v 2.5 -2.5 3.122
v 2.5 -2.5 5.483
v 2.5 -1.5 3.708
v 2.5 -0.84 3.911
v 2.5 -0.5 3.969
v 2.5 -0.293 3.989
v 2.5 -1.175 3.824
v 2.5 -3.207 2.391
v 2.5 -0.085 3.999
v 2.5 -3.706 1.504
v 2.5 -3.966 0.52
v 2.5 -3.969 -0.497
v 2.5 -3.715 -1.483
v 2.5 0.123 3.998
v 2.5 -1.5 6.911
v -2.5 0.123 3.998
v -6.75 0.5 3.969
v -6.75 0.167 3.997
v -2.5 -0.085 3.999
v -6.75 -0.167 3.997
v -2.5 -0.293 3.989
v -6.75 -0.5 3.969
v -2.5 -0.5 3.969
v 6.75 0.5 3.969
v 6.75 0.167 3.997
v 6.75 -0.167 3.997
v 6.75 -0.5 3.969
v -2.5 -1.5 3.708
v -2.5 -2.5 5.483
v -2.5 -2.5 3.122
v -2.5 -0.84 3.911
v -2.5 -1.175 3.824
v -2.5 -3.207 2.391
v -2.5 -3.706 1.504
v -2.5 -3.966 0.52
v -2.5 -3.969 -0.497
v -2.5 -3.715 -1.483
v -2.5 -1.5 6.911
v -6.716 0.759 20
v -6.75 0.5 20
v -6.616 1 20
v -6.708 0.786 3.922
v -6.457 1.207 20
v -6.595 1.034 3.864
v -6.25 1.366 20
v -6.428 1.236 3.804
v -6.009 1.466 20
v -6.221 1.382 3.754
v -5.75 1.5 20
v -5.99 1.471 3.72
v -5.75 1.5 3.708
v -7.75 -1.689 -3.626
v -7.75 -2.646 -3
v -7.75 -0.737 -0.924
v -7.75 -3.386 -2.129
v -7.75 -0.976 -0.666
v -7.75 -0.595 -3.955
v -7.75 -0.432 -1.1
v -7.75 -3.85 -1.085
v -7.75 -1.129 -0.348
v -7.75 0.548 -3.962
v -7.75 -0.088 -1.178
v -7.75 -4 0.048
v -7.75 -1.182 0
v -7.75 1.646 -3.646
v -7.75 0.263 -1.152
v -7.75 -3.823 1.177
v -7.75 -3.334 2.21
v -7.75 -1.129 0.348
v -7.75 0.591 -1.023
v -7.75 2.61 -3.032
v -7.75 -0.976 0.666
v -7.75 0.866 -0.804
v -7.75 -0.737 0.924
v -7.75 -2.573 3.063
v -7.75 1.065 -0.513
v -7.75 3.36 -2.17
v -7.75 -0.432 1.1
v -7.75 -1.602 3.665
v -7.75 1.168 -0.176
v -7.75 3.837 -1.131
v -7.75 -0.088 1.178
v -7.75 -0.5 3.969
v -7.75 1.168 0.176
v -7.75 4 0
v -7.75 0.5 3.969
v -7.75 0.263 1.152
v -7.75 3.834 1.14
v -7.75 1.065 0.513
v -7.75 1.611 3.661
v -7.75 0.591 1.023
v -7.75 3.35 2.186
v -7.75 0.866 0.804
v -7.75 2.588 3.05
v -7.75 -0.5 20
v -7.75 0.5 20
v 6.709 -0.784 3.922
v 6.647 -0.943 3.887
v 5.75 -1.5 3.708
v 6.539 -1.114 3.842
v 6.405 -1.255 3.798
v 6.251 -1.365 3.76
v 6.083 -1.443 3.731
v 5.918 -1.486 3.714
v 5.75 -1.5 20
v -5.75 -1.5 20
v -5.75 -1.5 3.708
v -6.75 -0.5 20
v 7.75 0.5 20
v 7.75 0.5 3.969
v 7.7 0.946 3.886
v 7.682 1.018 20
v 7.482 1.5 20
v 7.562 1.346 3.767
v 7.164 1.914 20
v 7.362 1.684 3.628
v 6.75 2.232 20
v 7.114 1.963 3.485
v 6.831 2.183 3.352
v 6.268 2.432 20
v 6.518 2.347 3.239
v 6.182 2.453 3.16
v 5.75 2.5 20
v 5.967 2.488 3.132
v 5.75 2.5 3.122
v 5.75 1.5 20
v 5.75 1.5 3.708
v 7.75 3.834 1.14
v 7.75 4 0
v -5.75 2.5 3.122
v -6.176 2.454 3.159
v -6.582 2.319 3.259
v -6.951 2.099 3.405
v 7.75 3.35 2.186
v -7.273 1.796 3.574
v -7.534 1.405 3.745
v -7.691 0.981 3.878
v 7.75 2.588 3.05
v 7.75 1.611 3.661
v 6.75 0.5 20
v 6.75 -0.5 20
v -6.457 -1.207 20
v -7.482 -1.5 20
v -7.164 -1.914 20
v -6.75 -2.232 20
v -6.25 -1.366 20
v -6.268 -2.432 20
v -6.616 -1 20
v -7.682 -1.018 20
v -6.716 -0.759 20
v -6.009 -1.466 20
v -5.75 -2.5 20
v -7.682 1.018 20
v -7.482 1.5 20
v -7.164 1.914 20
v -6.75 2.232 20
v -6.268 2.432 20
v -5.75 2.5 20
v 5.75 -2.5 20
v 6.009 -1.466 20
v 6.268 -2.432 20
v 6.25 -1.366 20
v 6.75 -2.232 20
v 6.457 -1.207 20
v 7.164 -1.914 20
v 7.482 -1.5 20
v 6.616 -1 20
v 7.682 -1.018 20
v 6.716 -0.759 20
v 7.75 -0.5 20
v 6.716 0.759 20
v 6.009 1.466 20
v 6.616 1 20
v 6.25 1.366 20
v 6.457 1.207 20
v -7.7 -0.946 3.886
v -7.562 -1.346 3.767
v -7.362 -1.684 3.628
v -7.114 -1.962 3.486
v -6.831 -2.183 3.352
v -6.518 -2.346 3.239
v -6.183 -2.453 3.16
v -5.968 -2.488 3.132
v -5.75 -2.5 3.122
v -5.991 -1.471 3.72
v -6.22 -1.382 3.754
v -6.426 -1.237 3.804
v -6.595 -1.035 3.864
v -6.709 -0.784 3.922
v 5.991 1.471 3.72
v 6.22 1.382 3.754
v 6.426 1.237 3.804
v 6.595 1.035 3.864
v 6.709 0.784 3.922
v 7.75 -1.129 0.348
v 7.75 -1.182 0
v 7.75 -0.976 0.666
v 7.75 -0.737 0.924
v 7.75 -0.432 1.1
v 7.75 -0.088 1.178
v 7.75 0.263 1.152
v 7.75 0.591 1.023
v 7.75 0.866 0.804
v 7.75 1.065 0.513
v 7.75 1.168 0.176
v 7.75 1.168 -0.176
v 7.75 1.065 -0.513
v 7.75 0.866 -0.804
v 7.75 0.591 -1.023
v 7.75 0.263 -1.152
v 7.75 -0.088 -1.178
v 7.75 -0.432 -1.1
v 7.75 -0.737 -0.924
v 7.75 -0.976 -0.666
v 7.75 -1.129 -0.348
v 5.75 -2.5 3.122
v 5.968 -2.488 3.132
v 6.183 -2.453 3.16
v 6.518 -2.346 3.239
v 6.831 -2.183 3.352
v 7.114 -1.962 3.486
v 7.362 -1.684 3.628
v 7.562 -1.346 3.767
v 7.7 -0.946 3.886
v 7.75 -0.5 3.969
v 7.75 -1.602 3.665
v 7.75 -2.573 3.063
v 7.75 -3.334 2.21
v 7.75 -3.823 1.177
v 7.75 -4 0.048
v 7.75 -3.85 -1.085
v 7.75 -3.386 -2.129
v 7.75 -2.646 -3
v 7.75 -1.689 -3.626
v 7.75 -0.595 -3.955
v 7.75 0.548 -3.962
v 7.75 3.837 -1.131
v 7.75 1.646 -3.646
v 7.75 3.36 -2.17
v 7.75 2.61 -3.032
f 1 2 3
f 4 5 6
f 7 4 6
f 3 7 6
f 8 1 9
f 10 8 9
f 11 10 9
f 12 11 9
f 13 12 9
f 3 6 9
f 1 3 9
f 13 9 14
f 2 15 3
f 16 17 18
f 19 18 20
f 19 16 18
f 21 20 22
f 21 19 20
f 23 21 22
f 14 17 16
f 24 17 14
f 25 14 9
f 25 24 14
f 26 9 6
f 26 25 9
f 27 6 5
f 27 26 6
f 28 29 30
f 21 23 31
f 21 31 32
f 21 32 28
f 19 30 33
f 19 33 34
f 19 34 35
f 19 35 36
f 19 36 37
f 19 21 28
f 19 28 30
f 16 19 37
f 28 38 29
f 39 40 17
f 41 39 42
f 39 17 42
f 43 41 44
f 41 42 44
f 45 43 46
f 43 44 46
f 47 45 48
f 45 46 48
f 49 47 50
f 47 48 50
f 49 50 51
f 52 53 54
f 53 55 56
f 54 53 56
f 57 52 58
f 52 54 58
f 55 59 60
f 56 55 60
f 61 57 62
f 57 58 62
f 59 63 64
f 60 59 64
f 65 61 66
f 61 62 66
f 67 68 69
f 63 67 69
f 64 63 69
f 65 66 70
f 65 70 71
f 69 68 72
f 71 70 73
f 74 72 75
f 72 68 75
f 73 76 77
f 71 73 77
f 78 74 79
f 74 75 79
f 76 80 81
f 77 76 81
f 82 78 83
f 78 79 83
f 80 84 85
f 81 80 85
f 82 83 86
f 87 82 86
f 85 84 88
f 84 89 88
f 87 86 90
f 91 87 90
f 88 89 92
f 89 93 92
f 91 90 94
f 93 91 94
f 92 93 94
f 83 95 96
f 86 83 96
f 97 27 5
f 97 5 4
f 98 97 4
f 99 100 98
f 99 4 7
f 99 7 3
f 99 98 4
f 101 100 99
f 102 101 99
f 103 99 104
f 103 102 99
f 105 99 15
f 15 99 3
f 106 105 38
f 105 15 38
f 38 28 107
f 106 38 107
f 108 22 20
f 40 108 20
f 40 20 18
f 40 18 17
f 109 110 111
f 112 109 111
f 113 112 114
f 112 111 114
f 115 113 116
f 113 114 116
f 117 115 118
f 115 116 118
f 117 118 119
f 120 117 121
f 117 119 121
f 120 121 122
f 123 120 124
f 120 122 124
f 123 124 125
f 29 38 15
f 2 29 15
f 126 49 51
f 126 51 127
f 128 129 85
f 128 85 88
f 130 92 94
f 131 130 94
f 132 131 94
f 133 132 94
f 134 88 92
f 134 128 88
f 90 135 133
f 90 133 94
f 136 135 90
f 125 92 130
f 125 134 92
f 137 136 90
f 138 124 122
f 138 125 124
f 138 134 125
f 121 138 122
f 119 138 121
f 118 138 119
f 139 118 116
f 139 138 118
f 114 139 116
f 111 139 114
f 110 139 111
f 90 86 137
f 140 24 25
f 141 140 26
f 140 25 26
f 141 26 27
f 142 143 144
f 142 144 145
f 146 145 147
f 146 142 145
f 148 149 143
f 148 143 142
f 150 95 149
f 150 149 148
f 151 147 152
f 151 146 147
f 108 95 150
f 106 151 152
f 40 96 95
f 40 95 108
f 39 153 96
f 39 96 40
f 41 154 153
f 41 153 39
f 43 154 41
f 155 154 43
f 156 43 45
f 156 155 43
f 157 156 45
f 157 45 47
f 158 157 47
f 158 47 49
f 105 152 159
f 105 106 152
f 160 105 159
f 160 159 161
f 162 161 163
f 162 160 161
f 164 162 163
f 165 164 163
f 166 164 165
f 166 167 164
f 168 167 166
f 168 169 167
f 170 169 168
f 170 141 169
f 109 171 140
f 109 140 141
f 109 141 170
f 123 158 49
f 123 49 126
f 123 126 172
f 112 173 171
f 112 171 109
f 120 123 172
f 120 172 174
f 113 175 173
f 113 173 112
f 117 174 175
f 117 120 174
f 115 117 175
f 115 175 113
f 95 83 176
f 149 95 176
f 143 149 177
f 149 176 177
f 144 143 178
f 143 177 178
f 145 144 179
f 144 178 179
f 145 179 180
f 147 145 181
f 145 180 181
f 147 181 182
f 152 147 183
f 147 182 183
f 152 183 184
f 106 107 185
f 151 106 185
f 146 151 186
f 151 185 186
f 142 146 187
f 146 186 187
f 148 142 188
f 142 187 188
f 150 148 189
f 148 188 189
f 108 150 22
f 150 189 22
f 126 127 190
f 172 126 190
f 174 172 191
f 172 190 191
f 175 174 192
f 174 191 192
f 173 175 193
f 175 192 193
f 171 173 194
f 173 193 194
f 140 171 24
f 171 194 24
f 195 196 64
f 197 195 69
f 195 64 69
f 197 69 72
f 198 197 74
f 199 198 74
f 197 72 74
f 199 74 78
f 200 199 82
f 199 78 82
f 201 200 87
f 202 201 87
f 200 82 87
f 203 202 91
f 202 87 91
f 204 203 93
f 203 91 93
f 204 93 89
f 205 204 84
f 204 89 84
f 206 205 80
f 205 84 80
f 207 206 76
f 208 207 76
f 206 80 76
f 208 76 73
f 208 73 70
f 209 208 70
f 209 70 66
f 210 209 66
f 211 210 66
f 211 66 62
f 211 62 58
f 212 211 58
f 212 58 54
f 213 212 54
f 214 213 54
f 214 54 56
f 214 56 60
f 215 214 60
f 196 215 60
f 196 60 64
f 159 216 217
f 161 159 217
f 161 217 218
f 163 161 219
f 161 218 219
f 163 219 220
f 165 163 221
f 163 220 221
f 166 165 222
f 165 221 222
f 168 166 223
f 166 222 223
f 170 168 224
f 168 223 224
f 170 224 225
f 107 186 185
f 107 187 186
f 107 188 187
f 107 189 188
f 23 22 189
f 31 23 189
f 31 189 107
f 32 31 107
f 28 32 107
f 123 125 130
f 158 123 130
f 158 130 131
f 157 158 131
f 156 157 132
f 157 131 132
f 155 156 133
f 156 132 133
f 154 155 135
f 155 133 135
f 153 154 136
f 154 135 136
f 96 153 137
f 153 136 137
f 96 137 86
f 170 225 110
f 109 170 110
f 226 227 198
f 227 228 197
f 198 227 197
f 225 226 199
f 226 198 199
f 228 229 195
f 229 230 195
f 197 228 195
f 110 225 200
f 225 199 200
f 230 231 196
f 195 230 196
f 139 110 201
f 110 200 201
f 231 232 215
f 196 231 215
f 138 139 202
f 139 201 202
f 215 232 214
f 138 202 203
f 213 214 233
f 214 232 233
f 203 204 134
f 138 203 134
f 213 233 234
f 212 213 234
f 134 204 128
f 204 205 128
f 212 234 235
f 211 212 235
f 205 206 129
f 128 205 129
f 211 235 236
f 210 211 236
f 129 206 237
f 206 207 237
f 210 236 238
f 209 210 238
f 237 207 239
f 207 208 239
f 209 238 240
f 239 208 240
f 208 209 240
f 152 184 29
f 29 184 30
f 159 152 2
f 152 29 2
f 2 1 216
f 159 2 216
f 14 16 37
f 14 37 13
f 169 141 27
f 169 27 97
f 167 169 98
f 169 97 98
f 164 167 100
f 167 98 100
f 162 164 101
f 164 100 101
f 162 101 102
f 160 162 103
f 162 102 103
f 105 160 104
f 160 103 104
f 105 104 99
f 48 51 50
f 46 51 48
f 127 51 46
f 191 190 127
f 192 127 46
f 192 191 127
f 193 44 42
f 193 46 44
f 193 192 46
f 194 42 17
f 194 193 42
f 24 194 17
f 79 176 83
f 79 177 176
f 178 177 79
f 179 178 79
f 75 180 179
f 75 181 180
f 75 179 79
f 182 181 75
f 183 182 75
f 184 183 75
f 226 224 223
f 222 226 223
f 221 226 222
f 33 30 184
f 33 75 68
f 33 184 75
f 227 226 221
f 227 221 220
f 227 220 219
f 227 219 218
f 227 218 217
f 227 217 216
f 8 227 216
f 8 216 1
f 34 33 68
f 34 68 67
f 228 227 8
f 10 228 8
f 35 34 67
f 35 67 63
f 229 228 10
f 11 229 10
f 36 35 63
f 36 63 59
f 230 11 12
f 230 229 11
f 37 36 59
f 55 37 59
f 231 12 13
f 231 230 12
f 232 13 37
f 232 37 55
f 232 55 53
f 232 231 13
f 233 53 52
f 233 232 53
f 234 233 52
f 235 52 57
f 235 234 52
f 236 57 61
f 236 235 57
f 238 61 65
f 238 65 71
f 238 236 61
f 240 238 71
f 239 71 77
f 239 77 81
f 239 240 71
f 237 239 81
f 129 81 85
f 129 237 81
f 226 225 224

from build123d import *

# Parameters (mm, degrees)
F1_DEPTH = 20
F3_DEPTH = 15.5
F5_W     = 5
F5_H     = 3
F6_DEPTH = 4.5
F7_R     = 1.1815986622
F8_DEPTH = 25


with BuildPart() as f1:
    # F0 (on Top) → F1 (new body)
    with BuildSketch(Plane.XY):
        with BuildLine():
            Line((5.75, 2.5), (-5.75, 2.5))
            ThreePointArc((-5.75, 2.5), (-7.1642135624, 1.9142135624), (-7.75, 0.5))
            Line((-7.75, 0.5), (-7.75, -0.5))
            ThreePointArc((-7.75, -0.5), (-7.1642135624, -1.9142135624), (-5.75, -2.5))
            Line((-5.75, -2.5), (5.75, -2.5))
            ThreePointArc((5.75, -2.5), (7.1642135624, -1.9142135624), (7.75, -0.5))
            Line((7.75, -0.5), (7.75, 0.5))
            ThreePointArc((7.75, 0.5), (7.1642135624, 1.9142135624), (5.75, 2.5))
        make_face()
        with BuildLine():
            ThreePointArc((-6.75, 0.5), (-6.4571067812, 1.2071067812), (-5.75, 1.5))
            Line((-5.75, 1.5), (5.75, 1.5))
            ThreePointArc((5.75, 1.5), (6.4571067812, 1.2071067812), (6.75, 0.5))
            Line((6.75, 0.5), (6.75, -0.5))
            ThreePointArc((6.75, -0.5), (6.4571067812, -1.2071067812), (5.75, -1.5))
            Line((5.75, -1.5), (-5.75, -1.5))
            ThreePointArc((-5.75, -1.5), (-6.4571067812, -1.2071067812), (-6.75, -0.5))
            Line((-6.75, -0.5), (-6.75, 0.5))
        make_face(mode=Mode.SUBTRACT)
    extrude(amount=F1_DEPTH)

    # F2 (on face) → F3 (join)
    with BuildSketch(Plane.YZ.offset(7.75)):
        with BuildLine():
            ThreePointArc((-0.5, 3.9686269666), (-2.6457513111, -3), (4, 0))
            ThreePointArc((4, 0), (3, 2.6457513111), (0.5, 3.9686269666))
            Line((0.5, 3.9686269666), (0.5, 0))
            Line((0.5, 0), (-0.5, 0))
            Line((-0.5, 0), (-0.5, 3.9686269666))
        make_face()
        with BuildLine():
            Line((0.5, 0), (0.5, 3.9686269666))
            ThreePointArc((0.5, 3.9686269666), (0, 4), (-0.5, 3.9686269666))
            Line((-0.5, 3.9686269666), (-0.5, 0))
            Line((-0.5, 0), (0.5, 0))
        make_face()
    extrude(amount=-F3_DEPTH)

    # F5 (on face) → F6 (cut, symmetric)
    with BuildSketch(Plane(origin=(0, 0.6446198131, 0.9206125012), x_dir=(1, 0, 0), z_dir=(0, 0.5735764364, 0.8191520443))):
        with Locations((0, -3.6926725879)):
            Rectangle(F5_W, F5_H)
    extrude(amount=F6_DEPTH, both=True, mode=Mode.SUBTRACT)

    # F7 (on face) → F8 (cut)
    with BuildSketch(Plane(origin=(-7.75, 0, 0), x_dir=(0, -1, 0), z_dir=(-1, 0, 0))):
        Circle(F7_R)
    extrude(amount=-F8_DEPTH, mode=Mode.SUBTRACT)


solid = f1.part
